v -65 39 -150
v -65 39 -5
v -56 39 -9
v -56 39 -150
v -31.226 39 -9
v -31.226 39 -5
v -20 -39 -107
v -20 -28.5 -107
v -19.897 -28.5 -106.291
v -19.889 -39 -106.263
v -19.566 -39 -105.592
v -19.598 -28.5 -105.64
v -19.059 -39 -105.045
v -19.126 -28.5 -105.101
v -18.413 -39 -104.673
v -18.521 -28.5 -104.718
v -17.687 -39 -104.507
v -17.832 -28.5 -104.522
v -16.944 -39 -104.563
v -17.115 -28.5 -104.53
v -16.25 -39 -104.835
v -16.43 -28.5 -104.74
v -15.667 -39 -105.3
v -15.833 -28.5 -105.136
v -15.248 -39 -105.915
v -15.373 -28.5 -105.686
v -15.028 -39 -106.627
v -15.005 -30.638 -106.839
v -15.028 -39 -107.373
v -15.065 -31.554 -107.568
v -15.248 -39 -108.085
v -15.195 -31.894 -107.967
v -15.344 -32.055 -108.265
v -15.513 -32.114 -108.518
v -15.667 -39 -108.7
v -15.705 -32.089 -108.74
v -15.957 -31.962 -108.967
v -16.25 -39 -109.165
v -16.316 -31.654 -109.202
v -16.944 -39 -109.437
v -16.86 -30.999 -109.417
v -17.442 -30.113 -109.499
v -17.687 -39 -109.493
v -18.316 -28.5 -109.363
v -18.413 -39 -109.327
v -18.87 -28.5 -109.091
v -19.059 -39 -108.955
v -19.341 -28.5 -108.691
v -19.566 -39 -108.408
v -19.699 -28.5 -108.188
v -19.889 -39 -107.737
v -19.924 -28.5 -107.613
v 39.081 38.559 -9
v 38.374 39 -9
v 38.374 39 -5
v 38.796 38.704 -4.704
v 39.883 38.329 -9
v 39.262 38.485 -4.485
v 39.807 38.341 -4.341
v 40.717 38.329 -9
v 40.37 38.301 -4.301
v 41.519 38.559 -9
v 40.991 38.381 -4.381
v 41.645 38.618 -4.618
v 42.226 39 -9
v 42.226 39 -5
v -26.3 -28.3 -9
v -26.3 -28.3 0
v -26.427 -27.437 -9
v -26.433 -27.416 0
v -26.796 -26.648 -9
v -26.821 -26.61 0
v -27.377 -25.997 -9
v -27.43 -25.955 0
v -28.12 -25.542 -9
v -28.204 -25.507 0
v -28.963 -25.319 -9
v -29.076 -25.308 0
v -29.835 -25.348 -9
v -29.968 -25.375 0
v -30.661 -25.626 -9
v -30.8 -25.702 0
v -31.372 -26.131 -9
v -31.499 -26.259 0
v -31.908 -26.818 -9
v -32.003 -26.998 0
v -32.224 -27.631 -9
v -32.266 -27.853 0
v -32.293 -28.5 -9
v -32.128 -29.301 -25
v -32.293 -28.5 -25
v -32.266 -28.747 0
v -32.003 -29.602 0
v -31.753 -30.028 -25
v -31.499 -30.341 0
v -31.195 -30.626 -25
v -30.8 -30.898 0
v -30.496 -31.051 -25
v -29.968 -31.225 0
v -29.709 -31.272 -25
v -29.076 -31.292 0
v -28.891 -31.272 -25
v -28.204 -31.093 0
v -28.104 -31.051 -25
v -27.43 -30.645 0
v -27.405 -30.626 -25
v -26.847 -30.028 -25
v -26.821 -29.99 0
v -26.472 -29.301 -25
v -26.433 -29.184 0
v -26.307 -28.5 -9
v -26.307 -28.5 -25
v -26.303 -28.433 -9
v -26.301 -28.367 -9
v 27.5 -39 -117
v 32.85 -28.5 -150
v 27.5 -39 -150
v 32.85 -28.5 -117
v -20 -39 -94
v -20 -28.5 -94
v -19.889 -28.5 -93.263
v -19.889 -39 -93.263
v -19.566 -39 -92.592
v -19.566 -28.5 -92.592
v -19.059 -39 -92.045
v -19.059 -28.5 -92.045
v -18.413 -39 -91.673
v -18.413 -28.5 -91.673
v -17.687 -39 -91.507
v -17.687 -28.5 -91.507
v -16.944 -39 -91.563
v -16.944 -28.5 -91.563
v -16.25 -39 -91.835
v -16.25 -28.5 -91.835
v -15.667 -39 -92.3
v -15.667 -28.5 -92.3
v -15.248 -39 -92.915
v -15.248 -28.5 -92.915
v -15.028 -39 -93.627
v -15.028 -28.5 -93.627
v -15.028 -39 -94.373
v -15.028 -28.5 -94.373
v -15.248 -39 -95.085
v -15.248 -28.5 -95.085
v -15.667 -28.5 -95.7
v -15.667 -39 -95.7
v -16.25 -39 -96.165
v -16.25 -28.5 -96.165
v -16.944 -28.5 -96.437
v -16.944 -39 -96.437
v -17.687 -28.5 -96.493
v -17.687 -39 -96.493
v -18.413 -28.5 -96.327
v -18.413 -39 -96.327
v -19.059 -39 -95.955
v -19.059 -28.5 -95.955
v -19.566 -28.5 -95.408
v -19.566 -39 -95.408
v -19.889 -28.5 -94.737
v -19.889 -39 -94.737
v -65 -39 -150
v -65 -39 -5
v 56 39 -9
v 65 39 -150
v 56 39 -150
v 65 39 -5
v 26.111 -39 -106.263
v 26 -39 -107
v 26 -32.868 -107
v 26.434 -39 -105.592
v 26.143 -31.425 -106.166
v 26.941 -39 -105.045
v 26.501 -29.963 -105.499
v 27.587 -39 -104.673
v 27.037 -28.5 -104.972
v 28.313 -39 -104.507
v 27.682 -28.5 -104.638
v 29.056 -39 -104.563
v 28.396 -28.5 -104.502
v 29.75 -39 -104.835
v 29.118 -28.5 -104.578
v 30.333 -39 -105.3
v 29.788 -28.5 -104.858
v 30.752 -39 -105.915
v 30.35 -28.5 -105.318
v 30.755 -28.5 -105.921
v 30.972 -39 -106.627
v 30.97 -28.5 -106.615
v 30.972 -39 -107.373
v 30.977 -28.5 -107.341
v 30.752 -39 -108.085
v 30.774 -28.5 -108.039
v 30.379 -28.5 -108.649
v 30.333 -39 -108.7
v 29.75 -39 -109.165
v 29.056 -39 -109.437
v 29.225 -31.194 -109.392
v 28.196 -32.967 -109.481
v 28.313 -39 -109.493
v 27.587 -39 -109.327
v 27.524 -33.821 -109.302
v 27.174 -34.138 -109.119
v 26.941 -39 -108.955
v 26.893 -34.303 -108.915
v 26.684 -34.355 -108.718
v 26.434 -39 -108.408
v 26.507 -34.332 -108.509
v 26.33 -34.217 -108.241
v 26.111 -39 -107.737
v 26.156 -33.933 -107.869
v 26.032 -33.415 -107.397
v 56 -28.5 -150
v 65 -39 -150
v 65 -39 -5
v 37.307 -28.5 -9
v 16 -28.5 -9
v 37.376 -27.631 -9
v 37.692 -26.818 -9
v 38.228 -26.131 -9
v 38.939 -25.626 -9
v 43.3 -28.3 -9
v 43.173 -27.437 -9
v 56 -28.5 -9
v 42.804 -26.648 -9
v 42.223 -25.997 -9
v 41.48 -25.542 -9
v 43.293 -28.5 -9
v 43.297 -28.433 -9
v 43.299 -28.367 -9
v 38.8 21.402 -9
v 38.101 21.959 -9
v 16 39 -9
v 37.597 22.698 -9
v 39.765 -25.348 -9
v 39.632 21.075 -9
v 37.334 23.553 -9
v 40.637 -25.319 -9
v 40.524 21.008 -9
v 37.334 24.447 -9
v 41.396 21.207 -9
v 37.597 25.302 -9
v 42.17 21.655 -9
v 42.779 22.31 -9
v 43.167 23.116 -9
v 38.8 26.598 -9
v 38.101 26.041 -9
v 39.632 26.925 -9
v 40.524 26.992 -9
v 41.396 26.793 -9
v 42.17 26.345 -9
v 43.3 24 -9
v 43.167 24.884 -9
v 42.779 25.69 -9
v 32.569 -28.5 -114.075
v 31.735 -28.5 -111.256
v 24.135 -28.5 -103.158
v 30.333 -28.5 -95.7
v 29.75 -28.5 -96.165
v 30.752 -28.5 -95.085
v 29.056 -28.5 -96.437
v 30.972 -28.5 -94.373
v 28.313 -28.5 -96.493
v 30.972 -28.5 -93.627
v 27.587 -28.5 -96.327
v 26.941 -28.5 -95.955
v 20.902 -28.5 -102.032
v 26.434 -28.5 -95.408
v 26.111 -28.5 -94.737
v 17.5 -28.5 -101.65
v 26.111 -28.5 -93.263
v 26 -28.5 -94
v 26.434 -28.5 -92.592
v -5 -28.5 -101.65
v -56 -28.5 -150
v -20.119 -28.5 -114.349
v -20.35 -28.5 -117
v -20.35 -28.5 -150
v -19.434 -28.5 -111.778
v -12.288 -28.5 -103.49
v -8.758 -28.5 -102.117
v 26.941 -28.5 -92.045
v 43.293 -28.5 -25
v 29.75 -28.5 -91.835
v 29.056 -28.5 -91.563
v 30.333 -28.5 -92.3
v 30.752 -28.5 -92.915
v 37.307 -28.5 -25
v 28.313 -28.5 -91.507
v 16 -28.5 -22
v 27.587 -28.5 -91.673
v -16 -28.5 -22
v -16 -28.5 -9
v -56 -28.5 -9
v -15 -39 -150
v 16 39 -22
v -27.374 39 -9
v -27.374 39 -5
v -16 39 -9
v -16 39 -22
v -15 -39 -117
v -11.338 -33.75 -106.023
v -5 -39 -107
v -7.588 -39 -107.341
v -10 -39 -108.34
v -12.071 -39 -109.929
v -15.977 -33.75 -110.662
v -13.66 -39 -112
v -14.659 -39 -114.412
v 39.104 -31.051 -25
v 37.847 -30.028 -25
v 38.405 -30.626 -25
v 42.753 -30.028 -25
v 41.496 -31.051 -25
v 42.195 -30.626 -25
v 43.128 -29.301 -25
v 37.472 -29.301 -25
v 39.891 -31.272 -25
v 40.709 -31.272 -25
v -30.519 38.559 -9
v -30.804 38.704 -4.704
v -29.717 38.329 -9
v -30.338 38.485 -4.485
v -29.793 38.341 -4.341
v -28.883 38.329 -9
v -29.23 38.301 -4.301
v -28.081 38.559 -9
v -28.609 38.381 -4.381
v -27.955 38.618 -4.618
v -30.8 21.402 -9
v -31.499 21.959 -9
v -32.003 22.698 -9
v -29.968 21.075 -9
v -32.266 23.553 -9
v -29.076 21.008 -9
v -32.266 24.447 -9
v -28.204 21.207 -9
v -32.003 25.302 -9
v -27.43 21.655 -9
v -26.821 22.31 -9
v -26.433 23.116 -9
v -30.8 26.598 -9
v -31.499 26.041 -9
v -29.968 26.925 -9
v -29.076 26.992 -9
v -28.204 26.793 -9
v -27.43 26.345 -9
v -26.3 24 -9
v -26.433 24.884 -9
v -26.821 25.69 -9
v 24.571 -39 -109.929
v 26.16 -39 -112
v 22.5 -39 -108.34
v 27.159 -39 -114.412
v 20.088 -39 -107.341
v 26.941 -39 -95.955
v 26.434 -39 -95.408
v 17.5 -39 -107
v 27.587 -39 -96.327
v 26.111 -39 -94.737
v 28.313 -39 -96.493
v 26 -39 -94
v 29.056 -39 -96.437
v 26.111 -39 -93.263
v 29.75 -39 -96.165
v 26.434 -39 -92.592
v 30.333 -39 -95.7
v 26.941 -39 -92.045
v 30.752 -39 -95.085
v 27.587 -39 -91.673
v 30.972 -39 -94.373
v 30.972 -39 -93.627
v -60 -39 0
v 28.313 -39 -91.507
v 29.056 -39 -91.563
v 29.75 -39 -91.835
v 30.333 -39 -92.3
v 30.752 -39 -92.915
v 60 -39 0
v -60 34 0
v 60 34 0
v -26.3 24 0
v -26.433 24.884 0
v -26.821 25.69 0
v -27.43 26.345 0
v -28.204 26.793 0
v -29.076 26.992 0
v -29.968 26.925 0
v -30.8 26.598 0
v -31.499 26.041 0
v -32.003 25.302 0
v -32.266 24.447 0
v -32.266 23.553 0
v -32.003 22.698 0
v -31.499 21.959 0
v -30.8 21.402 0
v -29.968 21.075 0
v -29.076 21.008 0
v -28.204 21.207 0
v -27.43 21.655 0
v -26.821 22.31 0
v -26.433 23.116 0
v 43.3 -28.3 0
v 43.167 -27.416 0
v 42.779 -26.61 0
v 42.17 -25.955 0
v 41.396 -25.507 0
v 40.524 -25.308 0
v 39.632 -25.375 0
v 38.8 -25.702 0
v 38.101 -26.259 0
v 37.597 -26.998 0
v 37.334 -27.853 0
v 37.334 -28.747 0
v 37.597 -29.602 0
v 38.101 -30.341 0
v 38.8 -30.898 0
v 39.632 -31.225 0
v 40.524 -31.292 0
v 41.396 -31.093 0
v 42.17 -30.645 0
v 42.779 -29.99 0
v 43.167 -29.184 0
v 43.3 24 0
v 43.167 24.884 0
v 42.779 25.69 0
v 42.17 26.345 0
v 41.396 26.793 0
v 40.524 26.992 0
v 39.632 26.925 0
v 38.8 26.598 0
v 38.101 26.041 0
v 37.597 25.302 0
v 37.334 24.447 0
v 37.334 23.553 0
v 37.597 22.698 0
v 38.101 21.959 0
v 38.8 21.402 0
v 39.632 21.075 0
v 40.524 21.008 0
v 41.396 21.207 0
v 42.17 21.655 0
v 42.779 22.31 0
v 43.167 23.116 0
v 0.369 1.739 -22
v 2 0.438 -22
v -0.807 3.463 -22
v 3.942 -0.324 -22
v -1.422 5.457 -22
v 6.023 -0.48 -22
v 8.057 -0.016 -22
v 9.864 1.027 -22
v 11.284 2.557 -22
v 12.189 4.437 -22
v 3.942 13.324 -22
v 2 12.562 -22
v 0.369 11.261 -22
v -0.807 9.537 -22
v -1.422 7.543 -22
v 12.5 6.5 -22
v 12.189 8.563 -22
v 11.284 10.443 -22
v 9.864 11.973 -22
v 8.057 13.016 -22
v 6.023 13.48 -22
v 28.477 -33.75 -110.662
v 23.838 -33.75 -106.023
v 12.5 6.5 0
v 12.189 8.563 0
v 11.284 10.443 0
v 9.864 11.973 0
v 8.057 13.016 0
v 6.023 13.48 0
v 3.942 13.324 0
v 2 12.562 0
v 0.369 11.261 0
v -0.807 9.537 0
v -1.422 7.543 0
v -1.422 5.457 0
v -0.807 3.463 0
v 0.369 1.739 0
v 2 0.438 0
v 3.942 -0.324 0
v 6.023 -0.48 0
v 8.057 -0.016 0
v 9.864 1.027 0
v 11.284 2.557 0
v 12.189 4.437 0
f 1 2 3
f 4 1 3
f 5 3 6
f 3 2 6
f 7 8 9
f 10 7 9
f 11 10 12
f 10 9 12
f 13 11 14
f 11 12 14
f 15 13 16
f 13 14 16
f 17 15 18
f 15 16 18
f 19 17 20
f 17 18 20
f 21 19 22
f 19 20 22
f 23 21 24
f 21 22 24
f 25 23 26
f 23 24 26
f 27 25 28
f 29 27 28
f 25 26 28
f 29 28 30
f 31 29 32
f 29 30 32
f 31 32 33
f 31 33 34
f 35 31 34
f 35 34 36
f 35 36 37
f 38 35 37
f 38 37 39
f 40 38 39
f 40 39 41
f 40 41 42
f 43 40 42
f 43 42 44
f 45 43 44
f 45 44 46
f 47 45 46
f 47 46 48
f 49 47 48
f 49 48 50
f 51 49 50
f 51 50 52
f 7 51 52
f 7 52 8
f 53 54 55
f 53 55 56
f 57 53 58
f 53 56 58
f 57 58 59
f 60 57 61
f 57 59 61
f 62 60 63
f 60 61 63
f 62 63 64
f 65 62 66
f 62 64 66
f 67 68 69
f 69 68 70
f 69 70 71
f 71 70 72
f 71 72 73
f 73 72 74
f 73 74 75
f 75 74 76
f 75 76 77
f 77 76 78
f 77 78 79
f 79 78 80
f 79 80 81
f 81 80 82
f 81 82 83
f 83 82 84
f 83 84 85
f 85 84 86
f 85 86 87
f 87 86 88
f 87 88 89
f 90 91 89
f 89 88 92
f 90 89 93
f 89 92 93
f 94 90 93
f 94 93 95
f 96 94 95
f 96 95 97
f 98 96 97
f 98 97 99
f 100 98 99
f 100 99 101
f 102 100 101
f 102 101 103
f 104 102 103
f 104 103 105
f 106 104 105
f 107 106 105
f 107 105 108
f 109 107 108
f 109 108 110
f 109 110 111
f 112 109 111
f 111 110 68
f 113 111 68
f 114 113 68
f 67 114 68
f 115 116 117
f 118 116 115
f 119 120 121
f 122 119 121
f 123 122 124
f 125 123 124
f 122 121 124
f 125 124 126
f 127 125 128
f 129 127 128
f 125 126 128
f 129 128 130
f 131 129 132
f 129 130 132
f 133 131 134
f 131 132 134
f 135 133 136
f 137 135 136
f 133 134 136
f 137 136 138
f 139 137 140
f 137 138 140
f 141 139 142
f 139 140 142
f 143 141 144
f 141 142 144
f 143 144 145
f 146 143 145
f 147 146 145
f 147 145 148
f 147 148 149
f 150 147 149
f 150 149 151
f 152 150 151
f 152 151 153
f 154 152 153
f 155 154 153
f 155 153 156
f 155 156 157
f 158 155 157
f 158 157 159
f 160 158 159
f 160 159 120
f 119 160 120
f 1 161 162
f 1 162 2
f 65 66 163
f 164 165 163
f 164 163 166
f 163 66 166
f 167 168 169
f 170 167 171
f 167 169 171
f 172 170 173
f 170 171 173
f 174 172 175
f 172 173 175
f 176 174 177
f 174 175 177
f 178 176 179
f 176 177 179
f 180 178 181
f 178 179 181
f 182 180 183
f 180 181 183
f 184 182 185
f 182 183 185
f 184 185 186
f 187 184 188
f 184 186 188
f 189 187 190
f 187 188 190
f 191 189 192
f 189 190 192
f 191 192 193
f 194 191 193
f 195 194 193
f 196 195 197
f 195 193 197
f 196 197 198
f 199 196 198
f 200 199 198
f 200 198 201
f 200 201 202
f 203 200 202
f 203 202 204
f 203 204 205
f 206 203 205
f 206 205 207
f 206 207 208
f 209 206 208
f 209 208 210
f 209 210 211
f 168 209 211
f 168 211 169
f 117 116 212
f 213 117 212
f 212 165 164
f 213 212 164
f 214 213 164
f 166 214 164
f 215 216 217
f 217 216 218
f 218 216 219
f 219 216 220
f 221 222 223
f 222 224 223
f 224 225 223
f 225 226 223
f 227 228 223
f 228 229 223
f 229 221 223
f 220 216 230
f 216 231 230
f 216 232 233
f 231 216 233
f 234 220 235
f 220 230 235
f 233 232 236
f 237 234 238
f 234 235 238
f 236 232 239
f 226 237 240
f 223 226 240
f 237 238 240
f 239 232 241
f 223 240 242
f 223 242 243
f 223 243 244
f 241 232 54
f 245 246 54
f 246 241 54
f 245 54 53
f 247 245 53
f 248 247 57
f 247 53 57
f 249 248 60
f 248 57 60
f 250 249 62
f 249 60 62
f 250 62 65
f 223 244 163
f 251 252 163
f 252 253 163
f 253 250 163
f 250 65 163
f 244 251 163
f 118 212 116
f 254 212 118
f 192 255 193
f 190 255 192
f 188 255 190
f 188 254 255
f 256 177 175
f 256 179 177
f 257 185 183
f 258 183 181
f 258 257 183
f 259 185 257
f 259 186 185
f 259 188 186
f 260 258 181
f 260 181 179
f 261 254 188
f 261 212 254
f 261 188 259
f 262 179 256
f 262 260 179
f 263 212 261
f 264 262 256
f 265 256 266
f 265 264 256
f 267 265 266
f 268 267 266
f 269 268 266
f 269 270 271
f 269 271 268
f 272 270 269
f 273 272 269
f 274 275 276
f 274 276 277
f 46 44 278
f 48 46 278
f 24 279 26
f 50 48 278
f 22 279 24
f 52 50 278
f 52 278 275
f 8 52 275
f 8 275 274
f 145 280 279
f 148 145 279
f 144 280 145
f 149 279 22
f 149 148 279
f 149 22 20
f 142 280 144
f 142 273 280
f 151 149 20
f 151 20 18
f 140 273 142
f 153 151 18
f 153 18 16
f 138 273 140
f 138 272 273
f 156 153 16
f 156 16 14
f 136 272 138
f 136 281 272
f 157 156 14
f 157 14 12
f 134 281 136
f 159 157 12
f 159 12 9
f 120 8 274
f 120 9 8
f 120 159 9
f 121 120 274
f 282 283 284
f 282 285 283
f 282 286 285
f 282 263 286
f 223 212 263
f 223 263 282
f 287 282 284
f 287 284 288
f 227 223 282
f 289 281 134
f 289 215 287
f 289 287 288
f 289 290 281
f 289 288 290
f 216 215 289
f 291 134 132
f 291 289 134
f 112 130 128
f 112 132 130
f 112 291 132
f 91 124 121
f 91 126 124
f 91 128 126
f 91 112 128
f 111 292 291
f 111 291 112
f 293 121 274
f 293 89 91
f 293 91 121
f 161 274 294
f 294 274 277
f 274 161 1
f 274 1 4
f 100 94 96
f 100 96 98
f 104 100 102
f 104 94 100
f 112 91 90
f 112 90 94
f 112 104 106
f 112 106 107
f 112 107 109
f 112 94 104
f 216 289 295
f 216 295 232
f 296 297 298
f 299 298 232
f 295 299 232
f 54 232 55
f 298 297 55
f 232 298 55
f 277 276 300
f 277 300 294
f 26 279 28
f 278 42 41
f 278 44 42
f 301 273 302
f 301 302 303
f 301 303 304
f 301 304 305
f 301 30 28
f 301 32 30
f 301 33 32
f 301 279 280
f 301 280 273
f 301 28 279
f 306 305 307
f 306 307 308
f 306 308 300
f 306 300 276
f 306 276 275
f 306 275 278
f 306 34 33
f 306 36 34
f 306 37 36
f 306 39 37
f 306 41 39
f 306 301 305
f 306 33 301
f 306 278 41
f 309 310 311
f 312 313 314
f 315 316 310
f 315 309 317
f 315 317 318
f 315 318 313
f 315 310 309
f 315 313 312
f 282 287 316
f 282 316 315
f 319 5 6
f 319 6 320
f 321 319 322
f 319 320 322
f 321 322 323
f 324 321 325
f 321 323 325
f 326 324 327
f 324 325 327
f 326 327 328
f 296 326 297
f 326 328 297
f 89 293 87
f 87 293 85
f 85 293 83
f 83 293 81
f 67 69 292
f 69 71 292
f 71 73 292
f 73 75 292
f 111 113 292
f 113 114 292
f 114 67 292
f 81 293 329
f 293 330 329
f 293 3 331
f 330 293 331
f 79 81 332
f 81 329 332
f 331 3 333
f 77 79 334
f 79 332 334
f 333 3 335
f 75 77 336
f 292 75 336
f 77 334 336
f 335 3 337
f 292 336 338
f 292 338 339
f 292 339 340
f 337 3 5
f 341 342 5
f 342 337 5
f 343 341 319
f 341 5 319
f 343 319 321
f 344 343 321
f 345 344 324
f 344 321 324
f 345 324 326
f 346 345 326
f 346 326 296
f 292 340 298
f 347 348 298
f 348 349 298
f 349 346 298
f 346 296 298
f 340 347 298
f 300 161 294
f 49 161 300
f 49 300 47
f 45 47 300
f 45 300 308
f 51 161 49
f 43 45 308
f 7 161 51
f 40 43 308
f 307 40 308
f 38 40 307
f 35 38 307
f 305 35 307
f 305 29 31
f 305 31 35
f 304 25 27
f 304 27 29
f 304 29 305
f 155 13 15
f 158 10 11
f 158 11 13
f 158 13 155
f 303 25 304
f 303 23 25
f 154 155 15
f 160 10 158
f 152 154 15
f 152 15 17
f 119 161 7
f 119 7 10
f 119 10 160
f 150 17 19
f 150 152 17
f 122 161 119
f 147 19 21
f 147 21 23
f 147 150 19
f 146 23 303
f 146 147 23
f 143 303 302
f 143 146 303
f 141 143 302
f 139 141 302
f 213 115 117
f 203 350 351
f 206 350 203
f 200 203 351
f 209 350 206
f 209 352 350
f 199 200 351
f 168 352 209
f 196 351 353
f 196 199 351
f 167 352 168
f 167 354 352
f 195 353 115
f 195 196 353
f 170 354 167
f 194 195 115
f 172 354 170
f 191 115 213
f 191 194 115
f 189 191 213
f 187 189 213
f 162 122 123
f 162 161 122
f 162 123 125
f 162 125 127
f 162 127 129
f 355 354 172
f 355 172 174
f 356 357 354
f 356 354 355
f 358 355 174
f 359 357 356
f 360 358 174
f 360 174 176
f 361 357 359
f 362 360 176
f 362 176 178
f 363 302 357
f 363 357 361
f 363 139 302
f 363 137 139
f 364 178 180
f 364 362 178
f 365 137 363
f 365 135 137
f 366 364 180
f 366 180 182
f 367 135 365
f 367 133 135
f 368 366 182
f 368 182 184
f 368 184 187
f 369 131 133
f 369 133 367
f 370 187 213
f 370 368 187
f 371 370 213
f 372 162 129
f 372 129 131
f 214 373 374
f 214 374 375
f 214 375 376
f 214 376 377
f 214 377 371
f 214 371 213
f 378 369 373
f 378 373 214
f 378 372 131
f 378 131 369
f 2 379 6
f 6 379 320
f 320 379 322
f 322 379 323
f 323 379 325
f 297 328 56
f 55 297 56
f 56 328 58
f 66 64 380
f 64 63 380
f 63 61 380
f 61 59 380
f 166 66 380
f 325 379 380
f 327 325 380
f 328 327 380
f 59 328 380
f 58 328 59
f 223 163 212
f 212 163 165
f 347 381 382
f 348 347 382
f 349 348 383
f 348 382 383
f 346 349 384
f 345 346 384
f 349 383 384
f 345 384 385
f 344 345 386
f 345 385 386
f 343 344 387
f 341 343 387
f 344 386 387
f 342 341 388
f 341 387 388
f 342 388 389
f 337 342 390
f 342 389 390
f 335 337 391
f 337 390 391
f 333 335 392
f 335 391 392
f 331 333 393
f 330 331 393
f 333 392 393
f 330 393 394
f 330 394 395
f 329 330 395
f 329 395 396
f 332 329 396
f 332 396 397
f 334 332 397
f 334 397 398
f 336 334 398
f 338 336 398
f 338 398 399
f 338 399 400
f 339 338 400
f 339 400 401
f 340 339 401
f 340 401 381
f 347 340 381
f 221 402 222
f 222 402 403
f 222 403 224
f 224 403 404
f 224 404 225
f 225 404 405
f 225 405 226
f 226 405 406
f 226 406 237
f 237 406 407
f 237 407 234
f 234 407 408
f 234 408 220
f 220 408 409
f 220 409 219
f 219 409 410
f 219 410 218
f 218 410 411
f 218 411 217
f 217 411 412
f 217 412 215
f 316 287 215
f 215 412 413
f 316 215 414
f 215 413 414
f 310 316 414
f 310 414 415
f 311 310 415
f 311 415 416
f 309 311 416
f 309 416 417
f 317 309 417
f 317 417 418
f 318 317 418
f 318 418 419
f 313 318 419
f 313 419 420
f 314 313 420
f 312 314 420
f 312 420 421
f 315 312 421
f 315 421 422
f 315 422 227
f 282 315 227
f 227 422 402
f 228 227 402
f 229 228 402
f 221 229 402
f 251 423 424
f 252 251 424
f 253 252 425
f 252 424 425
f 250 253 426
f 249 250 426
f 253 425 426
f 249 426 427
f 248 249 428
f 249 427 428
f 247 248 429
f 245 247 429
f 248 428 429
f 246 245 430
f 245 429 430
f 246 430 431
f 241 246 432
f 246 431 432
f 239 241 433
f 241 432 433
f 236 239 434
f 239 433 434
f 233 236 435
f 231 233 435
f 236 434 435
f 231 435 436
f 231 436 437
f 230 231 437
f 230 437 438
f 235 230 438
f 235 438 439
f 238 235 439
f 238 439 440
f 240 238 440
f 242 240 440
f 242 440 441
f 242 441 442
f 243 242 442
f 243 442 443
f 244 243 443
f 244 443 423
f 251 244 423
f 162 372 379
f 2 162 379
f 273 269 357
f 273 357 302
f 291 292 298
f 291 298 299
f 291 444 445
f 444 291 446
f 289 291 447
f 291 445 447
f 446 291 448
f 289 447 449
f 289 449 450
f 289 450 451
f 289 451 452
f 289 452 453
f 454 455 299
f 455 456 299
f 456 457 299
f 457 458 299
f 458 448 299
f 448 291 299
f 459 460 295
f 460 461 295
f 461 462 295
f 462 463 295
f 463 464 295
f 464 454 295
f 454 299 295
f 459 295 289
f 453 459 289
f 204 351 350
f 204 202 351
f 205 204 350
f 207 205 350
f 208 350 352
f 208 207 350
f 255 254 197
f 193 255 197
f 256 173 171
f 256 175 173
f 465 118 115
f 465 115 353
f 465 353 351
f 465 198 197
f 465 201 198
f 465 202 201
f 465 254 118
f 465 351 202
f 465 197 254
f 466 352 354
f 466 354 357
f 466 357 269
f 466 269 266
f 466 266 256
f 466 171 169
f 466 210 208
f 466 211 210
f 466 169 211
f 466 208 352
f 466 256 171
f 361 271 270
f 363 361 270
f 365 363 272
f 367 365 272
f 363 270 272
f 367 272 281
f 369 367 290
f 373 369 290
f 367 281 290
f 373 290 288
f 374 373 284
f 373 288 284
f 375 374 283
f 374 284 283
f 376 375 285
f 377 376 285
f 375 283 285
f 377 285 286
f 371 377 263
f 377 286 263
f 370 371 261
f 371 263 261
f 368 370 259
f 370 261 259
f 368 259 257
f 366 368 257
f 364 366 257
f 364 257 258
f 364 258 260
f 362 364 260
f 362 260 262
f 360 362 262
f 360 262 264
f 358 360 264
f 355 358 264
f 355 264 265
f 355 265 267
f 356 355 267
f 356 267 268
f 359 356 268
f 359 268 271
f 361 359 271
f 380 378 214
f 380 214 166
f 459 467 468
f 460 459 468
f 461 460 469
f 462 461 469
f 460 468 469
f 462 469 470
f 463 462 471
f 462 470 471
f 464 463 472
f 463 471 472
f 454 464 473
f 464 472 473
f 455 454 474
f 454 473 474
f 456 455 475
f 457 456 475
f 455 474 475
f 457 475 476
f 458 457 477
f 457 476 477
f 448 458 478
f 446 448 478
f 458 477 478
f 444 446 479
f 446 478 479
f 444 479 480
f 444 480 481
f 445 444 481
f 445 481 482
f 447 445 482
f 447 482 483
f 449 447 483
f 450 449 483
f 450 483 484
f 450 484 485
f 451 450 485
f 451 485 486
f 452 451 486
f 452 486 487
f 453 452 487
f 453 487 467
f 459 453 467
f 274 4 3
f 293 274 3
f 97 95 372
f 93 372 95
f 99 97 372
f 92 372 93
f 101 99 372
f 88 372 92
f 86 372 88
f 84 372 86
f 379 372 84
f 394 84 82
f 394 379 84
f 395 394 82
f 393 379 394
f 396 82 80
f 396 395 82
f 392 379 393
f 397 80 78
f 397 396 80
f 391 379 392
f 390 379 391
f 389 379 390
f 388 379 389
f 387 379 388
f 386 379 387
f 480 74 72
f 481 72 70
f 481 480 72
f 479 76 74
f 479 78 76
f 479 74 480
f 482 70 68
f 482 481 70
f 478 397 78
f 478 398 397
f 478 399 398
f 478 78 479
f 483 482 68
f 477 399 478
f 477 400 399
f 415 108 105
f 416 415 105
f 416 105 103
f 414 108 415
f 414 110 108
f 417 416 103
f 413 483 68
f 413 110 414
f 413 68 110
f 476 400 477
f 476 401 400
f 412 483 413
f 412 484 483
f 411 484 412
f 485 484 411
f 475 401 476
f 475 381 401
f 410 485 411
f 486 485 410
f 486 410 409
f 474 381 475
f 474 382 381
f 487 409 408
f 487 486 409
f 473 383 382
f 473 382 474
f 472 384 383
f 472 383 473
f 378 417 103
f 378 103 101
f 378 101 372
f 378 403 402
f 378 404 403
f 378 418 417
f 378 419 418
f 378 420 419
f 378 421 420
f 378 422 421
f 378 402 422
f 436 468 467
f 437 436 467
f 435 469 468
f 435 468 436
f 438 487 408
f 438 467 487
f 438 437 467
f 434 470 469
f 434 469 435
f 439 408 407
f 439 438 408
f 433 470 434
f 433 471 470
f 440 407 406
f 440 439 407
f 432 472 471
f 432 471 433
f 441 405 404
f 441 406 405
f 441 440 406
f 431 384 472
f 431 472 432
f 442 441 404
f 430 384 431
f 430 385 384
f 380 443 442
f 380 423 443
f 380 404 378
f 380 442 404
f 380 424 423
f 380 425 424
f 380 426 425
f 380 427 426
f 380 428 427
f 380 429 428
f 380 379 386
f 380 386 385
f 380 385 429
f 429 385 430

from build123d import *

# Parameters (mm, degrees)
F0_W      = 130
F0_H      = 78
F14_DEPTH = 150
F1_SIZE   = 5
F2_DEPTH  = 67.5
F4_R      = 6
F5_DEPTH  = 150.001
F6_R      = 7
F6_R_2    = 3
F7_DEPTH  = 25
F9_R      = 2.5
F10_DEPTH = 10.501
F11_DEPTH = 25
F11_TAPER = -27
F12_R     = 3
F13_DEPTH = 25


with BuildPart() as f14:
    # F0 (on Top) → F14 (new body)
    with BuildSketch(Plane.XY):
        Rectangle(F0_W, F0_H)
    extrude(amount=-F14_DEPTH)

    # F1
    f1_edges = [f14.edges().sort_by_distance(p)[0] for p in [
        (65, 0, 0),
        (-65, 0, 0),
        (0, 39, 0),
    ]]
    chamfer(f1_edges, length=F1_SIZE)

    # F15 (on face) → F2 (cut)
    with BuildSketch(Plane(origin=(0, 39, 0), x_dir=(-1, 0, 0), z_dir=(0, 1, 0))):
        Polygon((-16, -9), (-56, -9), (-56, -150), (56, -150), (56, -9), (16, -9), (16, -22), (-16, -22), align=None)
    extrude(amount=-F2_DEPTH, mode=Mode.SUBTRACT)

    # F4 (on face) → F5 (cut, through all)
    with BuildSketch(Plane.XY):
        with Locations((5.5, 6.5)):
            Circle(F4_R)
    extrude(amount=-F5_DEPTH, mode=Mode.SUBTRACT)

    # F6 (on face) → F7 (cut)
    with BuildSketch(Plane.XY):
        with Locations((5.5, 6.5)):
            Circle(F6_R)
        with Locations((-29.3, -28.3)):
            Circle(F6_R_2)
        with Locations((-29.3, 41.3)):
            Circle(F6_R_2)
        with Locations((40.3, 41.3)):
            Circle(F6_R_2)
        with Locations((40.3, -28.3)):
            Circle(F6_R_2)
    extrude(amount=-F7_DEPTH, mode=Mode.SUBTRACT)

    # F9 (on face) → F10 (cut, through all)
    with BuildSketch(Plane(origin=(0, -28.5, 0), x_dir=(-1, 0, 0), z_dir=(0, 1, 0))):
        with Locations((-28.5, -94)):
            Circle(F9_R)
        with Locations((-28.5, -107)):
            Circle(F9_R)
        with Locations((17.5, -94)):
            Circle(F9_R)
        with Locations((17.5, -107)):
            Circle(F9_R)
    extrude(amount=-F10_DEPTH, mode=Mode.SUBTRACT)

    # F16 (on face) → F11 (cut)
    with BuildSketch(Plane.XZ.offset(39)):
        with BuildLine():
            Line((17.5, -107), (-5, -107))
            ThreePointArc((-5, -107), (-12.0710678119, -109.9289321881), (-15, -117))
            Line((-15, -117), (-15, -150))
            Line((-15, -150), (27.5, -150))
            Line((27.5, -150), (27.5, -117))
            ThreePointArc((27.5, -117), (24.5710678119, -109.9289321881), (17.5, -107))
        make_face()
    extrude(amount=-F11_DEPTH, taper=F11_TAPER, mode=Mode.SUBTRACT)

    # F12 (on face) → F13 (cut)
    with BuildSketch(Plane.XY):
        with Locations((-29.3, 24)):
            Circle(F12_R)
        with Locations((40.3, 24)):
            Circle(F12_R)
    extrude(amount=-F13_DEPTH, mode=Mode.SUBTRACT)


solid = f14.part
